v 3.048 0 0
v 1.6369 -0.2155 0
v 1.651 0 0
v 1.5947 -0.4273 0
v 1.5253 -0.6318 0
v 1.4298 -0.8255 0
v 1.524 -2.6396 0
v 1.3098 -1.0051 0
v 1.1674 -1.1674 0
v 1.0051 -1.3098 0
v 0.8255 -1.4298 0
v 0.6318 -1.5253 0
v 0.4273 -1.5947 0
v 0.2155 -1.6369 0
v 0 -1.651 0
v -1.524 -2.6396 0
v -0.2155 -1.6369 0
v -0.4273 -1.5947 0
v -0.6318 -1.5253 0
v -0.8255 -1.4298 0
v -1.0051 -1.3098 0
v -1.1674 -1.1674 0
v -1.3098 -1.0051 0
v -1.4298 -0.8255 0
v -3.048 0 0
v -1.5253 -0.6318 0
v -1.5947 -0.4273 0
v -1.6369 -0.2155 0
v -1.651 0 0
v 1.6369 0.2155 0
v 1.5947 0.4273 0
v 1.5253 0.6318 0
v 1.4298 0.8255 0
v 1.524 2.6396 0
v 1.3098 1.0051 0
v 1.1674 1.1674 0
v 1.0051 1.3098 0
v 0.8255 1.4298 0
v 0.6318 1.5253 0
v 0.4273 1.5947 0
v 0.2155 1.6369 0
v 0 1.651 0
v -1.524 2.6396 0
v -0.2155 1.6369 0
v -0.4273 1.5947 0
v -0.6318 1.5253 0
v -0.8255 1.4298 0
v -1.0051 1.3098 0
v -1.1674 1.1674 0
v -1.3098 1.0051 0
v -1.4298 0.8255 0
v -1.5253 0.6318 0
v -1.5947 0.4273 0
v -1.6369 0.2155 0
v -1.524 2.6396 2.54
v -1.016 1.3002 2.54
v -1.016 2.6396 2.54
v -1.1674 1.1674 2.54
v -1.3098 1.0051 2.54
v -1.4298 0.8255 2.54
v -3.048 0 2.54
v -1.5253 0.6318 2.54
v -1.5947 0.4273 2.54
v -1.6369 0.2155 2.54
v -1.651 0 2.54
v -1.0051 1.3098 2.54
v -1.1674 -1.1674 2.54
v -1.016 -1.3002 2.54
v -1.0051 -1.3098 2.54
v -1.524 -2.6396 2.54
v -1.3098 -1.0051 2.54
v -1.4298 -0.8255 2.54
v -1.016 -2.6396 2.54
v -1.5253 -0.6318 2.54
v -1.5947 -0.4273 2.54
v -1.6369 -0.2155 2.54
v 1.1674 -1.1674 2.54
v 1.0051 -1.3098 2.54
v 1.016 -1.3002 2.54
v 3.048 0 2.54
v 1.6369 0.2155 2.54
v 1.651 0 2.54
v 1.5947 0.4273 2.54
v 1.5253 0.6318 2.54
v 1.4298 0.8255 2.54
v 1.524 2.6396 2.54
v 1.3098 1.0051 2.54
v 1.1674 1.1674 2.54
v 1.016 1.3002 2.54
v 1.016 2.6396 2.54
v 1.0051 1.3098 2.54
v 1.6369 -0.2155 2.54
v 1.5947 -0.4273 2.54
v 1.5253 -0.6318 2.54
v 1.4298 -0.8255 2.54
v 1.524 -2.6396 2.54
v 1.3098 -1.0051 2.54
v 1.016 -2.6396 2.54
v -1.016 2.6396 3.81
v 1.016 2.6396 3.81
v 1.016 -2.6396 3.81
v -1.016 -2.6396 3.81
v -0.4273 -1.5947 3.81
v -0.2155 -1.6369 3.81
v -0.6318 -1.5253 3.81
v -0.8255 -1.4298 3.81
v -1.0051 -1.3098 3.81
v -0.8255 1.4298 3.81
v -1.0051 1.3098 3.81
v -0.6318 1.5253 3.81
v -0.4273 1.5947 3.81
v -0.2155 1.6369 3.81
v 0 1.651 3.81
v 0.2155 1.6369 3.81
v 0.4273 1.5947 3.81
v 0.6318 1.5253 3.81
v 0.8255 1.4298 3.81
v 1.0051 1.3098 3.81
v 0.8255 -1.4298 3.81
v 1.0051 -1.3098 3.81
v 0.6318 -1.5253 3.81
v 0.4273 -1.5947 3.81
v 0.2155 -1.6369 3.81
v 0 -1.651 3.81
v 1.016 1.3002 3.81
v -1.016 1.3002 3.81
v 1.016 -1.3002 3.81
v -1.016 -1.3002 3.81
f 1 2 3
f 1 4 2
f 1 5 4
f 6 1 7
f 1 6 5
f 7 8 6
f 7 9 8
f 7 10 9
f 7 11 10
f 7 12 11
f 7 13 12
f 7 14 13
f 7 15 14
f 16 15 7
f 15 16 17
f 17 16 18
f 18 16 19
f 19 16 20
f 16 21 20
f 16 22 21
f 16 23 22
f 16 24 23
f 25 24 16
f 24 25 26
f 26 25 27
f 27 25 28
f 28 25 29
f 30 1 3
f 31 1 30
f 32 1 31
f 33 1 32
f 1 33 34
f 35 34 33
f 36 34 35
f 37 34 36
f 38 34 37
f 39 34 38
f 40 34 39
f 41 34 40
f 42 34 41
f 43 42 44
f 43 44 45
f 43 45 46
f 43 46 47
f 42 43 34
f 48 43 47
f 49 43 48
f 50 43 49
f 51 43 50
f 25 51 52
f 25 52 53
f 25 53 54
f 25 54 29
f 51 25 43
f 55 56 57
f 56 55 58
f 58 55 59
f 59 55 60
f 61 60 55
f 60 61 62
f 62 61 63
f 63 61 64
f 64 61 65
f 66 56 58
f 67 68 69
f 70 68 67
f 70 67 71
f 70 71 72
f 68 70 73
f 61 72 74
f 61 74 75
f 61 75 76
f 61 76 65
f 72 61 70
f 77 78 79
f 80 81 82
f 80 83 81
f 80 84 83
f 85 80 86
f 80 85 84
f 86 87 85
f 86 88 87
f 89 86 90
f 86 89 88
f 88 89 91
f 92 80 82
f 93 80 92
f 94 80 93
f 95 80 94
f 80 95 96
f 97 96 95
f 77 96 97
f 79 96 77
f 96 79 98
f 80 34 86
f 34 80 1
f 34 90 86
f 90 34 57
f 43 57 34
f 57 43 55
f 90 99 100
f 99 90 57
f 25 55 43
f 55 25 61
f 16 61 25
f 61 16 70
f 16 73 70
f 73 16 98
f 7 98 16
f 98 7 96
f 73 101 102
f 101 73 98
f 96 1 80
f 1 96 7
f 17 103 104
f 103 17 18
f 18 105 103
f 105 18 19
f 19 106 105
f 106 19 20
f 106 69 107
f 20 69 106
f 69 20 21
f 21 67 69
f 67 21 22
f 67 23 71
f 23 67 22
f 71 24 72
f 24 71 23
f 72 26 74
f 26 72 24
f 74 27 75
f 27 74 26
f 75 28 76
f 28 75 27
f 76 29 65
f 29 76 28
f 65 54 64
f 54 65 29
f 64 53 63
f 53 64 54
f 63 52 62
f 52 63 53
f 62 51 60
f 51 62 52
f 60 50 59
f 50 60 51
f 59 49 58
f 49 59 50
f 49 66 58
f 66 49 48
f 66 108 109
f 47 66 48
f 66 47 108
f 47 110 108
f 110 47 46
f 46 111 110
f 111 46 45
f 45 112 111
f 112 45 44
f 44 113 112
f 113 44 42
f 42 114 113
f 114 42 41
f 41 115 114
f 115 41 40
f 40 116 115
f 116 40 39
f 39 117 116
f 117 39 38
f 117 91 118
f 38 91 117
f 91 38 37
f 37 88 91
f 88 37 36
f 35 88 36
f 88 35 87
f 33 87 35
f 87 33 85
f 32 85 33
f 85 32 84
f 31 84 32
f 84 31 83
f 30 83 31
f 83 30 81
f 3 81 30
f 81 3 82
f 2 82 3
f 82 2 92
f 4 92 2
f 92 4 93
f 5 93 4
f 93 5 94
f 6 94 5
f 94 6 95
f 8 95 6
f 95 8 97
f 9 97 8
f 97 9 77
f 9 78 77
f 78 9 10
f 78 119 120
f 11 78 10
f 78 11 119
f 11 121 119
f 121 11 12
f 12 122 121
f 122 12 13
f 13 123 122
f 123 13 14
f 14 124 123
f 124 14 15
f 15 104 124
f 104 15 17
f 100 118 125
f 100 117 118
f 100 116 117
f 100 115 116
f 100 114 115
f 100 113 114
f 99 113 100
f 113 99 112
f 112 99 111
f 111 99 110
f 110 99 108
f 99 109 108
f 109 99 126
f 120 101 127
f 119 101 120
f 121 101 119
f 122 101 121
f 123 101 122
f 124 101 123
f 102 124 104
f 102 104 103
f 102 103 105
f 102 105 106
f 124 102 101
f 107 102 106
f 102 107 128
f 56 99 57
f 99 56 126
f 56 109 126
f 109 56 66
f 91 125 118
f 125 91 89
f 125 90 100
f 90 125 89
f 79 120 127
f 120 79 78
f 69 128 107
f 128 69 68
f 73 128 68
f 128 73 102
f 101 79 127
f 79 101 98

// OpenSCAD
ViewScale = [0.0254, 0.0254, 0.0254];

module adapter()
{
    linear_extrude(100)
    difference () {
    circle(240/2, $fn=6);
    circle(130/2, $fn=48);
    }

    translate([0, 0, 100])
    linear_extrude(50)
    intersection () {
    square([80, 240], center=true);
    difference () {
    circle(240/2, $fn=6);
    circle(130/2, $fn=48);
    }}
}


scale(ViewScale)
{
    adapter();
}
